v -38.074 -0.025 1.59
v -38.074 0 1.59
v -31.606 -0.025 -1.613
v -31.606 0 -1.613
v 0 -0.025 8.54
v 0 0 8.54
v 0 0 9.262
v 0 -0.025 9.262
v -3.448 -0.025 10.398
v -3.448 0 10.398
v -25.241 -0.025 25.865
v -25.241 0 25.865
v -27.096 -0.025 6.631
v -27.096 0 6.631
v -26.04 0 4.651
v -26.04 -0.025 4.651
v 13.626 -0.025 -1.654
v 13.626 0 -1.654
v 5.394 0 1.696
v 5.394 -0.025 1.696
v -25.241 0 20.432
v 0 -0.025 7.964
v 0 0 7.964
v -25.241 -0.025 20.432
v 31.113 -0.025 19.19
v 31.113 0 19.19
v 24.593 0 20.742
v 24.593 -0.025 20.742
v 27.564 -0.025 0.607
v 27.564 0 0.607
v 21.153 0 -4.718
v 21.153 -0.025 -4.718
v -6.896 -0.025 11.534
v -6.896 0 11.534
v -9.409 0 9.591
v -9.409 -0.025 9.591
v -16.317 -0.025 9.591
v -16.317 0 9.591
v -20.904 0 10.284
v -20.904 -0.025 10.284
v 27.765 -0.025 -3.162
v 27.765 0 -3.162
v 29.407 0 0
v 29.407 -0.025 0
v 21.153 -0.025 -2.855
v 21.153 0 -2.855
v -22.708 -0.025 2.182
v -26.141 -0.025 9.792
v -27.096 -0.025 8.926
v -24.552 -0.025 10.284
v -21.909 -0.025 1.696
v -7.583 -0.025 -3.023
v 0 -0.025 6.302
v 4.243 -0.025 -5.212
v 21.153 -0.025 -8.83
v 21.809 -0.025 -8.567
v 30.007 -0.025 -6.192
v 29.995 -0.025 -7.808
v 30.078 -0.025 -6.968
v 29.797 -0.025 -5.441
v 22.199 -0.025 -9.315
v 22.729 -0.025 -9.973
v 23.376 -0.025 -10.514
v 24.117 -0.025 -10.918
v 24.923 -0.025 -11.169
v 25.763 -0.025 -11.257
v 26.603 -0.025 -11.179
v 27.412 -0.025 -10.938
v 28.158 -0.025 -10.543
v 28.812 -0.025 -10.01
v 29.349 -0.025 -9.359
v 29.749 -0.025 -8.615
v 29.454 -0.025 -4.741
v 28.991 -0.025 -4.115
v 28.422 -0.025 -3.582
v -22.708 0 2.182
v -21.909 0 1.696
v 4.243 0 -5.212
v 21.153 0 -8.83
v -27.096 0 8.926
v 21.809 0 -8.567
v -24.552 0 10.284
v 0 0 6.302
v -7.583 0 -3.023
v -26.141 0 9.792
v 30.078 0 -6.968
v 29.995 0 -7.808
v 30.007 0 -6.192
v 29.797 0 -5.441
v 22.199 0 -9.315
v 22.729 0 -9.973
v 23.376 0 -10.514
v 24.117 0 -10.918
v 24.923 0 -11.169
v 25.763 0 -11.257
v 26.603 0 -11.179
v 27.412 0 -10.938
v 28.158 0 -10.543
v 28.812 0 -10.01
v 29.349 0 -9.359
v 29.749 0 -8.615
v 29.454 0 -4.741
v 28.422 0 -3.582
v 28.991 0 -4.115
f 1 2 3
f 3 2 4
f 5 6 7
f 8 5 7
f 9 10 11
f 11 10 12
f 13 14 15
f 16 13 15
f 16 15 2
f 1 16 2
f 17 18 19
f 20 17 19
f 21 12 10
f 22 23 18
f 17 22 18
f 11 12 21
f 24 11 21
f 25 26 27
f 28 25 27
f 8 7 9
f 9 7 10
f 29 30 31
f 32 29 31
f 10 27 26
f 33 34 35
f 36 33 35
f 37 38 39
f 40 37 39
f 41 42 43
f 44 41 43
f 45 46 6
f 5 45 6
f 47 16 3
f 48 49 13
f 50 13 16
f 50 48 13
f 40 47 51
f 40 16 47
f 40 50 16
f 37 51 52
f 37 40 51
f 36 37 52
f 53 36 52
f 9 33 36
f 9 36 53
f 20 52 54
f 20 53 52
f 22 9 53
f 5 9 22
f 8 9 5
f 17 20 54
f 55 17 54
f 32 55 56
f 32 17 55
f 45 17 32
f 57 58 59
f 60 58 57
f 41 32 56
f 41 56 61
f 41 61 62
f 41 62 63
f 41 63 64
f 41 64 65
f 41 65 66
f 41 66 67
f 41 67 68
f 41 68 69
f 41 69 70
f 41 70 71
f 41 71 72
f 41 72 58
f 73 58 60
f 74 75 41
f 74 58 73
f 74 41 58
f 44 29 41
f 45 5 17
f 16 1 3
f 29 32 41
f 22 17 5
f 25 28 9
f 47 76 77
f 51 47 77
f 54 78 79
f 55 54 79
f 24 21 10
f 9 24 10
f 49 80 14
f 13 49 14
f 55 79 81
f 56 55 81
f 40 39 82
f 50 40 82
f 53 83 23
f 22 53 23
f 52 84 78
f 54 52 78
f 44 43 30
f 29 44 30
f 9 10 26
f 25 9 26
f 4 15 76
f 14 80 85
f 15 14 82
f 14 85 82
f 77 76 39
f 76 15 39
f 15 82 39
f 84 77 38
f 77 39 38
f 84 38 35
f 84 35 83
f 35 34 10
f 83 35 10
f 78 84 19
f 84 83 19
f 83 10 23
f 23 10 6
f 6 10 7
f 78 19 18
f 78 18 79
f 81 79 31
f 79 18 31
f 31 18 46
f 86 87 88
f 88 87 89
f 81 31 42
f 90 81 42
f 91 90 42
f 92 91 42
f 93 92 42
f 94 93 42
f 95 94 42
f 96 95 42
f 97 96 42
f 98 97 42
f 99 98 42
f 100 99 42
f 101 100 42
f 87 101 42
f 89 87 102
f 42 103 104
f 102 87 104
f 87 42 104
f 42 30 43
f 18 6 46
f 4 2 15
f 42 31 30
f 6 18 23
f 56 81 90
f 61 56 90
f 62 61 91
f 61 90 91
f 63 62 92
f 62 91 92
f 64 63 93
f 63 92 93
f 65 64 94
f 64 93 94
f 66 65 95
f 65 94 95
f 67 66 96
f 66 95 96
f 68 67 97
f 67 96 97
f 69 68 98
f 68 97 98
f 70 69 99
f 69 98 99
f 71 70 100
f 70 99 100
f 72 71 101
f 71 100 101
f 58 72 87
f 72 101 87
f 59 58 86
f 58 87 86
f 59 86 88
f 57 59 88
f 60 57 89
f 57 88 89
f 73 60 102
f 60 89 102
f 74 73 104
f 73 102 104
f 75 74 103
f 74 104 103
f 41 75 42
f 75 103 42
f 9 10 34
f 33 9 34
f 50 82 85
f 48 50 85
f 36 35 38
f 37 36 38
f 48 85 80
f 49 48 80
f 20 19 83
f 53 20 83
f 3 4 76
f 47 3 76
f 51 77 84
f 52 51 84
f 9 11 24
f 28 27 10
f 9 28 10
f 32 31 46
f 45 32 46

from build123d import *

# Parameters (mm, degrees)
F1_DEPTH = 0.0254


with BuildPart() as f1:
    # F0 (on Front) → F1 (new body)
    with BuildSketch(Plane.XZ):
        with BuildLine():
            Line((21.1532198297, -4.7183046117), (21.1532198297, -6.9679971619))
            Line((21.1532198297, -6.9679971619), (0, 0))
            Line((0, 0), (-15.699960563, 5.1716609351))
            Line((-15.699960563, 5.1716609351), (-22.7077419713, 2.1823952402))
            Line((-22.7077419713, 2.1823952402), (-21.9090841711, 1.6962556401))
            Line((-21.9090841711, 1.6962556401), (-7.5829812436, -3.0228483707))
            Line((-7.5829812436, -3.0228483707), (4.2425836436, -5.2117318846))
            Line((4.2425836436, -5.2117318846), (21.1532198297, -8.8302018121))
            Line((21.1532198297, -8.8302018121), (21.8092405149, -8.5666724092))
            ThreePointArc((21.8092405149, -8.5666724092), (22.9068702124, -3.7919284222), (27.7654646969, -3.1618246777))
            Line((27.7654646969, -3.1618246777), (29.4073950499, 0))
            Line((29.4073950499, 0), (27.5644548807, 0.6070755172))
            Line((27.5644548807, 0.6070755172), (21.1532198297, -4.7183046117))
        make_face()
        Polygon((0, 0), (21.1532198297, -6.9679971619), (13.6257617504, -1.6543792964), (5.3939148784, 1.6962556401), (0, 6.3015804626), (0, 7.9640191465), (-3.4479540106, 10.3979231068), (-15.699960563, 5.1716609351), align=None)
        Polygon((13.6257617504, -1.6543792964), (21.1532198297, -6.9679971619), (21.1532198297, -4.7183046117), align=None)
        Polygon((0, 7.9640191465), (13.6257617504, -1.6543792964), (21.1532198297, -4.7183046117), (21.1532198297, -2.8550466523), (0, 8.5404657949), align=None)
        Polygon((-22.7077419713, 2.1823952402), (-15.699960563, 5.1716609351), (-19.3135461728, 6.3619976534), (-26.0399777707, 4.6509126704), (-25.6920289248, 3.9989179932), align=None)
        Polygon((-19.3135461728, 6.3619976534), (-15.699960563, 5.1716609351), (-3.4479540106, 10.3979231068), align=None)
        Polygon((-3.4479540106, 10.3979231068), (0, 7.9640191465), (0, 8.5404657949), align=None)
        Polygon((-26.0399777707, 4.6509126704), (-19.3135461728, 6.3619976534), (-27.0964379525, 8.9257287671), (-27.0964379525, 6.6305324435), align=None)
        Polygon((-27.0964379525, 8.9257287671), (-19.3135461728, 6.3619976534), (-3.4479540106, 10.3979231068), (-6.8959080211, 11.5336997854), (-9.4089163467, 9.5910979435), (-16.3169037551, 9.5910979435), (-20.9037661552, 10.2842394263), (-24.552013725, 10.2842394263), (-26.1405128986, 9.7918696702), align=None)
        Polygon((-31.6055566072, -1.613090164), (-22.7077419713, 2.1823952402), (-25.6920289248, 3.9989179932), (-26.0399777707, 4.6509126704), (-38.0744349224, 1.5895600628), align=None)
        Polygon((0, 9.2621464282), (-3.4479540106, 10.3979231068), (0, 8.5404657949), align=None)
        with BuildLine():
            ThreePointArc((30.0777081459, -6.9679971619), (29.4543452287, -4.7412608312), (27.7654646969, -3.1618246777))
            Line((27.7654646969, -3.1618246777), (25.7889255881, -6.9679971619))
            Line((25.7889255881, -6.9679971619), (21.8092405149, -8.5666724092))
            ThreePointArc((21.8092405149, -8.5666724092), (26.603066823, -11.1787963589), (30.0777081459, -6.9679971619))
        make_face()
        with BuildLine():
            Line((25.7889255881, -6.9679971619), (27.7654646969, -3.1618246777))
            ThreePointArc((27.7654646969, -3.1618246777), (22.9068702124, -3.7919284222), (21.8092405149, -8.5666724092))
            Line((21.8092405149, -8.5666724092), (25.7889255881, -6.9679971619))
        make_face()
    extrude(amount=F1_DEPTH)


with BuildPart() as f1b:
    # F0 (on Front) → F1, piece 2 (new body)
    with BuildSketch(Plane.XZ):
        Polygon((-25.2405274659, 20.4316396266), (-3.4479540106, 10.3979231068), (-25.2405274659, 25.8651990443), align=None)
    extrude(amount=F1_DEPTH)


with BuildPart() as f1c:
    # F0 (on Front) → F1, piece 3 (new body)
    with BuildSketch(Plane.XZ):
        Polygon((24.5929788798, 20.7421295345), (-3.4479540106, 10.3979231068), (31.1132539064, 19.1896818578), align=None)
    extrude(amount=F1_DEPTH)


solid = Compound([f1.part, f1b.part, f1c.part])
